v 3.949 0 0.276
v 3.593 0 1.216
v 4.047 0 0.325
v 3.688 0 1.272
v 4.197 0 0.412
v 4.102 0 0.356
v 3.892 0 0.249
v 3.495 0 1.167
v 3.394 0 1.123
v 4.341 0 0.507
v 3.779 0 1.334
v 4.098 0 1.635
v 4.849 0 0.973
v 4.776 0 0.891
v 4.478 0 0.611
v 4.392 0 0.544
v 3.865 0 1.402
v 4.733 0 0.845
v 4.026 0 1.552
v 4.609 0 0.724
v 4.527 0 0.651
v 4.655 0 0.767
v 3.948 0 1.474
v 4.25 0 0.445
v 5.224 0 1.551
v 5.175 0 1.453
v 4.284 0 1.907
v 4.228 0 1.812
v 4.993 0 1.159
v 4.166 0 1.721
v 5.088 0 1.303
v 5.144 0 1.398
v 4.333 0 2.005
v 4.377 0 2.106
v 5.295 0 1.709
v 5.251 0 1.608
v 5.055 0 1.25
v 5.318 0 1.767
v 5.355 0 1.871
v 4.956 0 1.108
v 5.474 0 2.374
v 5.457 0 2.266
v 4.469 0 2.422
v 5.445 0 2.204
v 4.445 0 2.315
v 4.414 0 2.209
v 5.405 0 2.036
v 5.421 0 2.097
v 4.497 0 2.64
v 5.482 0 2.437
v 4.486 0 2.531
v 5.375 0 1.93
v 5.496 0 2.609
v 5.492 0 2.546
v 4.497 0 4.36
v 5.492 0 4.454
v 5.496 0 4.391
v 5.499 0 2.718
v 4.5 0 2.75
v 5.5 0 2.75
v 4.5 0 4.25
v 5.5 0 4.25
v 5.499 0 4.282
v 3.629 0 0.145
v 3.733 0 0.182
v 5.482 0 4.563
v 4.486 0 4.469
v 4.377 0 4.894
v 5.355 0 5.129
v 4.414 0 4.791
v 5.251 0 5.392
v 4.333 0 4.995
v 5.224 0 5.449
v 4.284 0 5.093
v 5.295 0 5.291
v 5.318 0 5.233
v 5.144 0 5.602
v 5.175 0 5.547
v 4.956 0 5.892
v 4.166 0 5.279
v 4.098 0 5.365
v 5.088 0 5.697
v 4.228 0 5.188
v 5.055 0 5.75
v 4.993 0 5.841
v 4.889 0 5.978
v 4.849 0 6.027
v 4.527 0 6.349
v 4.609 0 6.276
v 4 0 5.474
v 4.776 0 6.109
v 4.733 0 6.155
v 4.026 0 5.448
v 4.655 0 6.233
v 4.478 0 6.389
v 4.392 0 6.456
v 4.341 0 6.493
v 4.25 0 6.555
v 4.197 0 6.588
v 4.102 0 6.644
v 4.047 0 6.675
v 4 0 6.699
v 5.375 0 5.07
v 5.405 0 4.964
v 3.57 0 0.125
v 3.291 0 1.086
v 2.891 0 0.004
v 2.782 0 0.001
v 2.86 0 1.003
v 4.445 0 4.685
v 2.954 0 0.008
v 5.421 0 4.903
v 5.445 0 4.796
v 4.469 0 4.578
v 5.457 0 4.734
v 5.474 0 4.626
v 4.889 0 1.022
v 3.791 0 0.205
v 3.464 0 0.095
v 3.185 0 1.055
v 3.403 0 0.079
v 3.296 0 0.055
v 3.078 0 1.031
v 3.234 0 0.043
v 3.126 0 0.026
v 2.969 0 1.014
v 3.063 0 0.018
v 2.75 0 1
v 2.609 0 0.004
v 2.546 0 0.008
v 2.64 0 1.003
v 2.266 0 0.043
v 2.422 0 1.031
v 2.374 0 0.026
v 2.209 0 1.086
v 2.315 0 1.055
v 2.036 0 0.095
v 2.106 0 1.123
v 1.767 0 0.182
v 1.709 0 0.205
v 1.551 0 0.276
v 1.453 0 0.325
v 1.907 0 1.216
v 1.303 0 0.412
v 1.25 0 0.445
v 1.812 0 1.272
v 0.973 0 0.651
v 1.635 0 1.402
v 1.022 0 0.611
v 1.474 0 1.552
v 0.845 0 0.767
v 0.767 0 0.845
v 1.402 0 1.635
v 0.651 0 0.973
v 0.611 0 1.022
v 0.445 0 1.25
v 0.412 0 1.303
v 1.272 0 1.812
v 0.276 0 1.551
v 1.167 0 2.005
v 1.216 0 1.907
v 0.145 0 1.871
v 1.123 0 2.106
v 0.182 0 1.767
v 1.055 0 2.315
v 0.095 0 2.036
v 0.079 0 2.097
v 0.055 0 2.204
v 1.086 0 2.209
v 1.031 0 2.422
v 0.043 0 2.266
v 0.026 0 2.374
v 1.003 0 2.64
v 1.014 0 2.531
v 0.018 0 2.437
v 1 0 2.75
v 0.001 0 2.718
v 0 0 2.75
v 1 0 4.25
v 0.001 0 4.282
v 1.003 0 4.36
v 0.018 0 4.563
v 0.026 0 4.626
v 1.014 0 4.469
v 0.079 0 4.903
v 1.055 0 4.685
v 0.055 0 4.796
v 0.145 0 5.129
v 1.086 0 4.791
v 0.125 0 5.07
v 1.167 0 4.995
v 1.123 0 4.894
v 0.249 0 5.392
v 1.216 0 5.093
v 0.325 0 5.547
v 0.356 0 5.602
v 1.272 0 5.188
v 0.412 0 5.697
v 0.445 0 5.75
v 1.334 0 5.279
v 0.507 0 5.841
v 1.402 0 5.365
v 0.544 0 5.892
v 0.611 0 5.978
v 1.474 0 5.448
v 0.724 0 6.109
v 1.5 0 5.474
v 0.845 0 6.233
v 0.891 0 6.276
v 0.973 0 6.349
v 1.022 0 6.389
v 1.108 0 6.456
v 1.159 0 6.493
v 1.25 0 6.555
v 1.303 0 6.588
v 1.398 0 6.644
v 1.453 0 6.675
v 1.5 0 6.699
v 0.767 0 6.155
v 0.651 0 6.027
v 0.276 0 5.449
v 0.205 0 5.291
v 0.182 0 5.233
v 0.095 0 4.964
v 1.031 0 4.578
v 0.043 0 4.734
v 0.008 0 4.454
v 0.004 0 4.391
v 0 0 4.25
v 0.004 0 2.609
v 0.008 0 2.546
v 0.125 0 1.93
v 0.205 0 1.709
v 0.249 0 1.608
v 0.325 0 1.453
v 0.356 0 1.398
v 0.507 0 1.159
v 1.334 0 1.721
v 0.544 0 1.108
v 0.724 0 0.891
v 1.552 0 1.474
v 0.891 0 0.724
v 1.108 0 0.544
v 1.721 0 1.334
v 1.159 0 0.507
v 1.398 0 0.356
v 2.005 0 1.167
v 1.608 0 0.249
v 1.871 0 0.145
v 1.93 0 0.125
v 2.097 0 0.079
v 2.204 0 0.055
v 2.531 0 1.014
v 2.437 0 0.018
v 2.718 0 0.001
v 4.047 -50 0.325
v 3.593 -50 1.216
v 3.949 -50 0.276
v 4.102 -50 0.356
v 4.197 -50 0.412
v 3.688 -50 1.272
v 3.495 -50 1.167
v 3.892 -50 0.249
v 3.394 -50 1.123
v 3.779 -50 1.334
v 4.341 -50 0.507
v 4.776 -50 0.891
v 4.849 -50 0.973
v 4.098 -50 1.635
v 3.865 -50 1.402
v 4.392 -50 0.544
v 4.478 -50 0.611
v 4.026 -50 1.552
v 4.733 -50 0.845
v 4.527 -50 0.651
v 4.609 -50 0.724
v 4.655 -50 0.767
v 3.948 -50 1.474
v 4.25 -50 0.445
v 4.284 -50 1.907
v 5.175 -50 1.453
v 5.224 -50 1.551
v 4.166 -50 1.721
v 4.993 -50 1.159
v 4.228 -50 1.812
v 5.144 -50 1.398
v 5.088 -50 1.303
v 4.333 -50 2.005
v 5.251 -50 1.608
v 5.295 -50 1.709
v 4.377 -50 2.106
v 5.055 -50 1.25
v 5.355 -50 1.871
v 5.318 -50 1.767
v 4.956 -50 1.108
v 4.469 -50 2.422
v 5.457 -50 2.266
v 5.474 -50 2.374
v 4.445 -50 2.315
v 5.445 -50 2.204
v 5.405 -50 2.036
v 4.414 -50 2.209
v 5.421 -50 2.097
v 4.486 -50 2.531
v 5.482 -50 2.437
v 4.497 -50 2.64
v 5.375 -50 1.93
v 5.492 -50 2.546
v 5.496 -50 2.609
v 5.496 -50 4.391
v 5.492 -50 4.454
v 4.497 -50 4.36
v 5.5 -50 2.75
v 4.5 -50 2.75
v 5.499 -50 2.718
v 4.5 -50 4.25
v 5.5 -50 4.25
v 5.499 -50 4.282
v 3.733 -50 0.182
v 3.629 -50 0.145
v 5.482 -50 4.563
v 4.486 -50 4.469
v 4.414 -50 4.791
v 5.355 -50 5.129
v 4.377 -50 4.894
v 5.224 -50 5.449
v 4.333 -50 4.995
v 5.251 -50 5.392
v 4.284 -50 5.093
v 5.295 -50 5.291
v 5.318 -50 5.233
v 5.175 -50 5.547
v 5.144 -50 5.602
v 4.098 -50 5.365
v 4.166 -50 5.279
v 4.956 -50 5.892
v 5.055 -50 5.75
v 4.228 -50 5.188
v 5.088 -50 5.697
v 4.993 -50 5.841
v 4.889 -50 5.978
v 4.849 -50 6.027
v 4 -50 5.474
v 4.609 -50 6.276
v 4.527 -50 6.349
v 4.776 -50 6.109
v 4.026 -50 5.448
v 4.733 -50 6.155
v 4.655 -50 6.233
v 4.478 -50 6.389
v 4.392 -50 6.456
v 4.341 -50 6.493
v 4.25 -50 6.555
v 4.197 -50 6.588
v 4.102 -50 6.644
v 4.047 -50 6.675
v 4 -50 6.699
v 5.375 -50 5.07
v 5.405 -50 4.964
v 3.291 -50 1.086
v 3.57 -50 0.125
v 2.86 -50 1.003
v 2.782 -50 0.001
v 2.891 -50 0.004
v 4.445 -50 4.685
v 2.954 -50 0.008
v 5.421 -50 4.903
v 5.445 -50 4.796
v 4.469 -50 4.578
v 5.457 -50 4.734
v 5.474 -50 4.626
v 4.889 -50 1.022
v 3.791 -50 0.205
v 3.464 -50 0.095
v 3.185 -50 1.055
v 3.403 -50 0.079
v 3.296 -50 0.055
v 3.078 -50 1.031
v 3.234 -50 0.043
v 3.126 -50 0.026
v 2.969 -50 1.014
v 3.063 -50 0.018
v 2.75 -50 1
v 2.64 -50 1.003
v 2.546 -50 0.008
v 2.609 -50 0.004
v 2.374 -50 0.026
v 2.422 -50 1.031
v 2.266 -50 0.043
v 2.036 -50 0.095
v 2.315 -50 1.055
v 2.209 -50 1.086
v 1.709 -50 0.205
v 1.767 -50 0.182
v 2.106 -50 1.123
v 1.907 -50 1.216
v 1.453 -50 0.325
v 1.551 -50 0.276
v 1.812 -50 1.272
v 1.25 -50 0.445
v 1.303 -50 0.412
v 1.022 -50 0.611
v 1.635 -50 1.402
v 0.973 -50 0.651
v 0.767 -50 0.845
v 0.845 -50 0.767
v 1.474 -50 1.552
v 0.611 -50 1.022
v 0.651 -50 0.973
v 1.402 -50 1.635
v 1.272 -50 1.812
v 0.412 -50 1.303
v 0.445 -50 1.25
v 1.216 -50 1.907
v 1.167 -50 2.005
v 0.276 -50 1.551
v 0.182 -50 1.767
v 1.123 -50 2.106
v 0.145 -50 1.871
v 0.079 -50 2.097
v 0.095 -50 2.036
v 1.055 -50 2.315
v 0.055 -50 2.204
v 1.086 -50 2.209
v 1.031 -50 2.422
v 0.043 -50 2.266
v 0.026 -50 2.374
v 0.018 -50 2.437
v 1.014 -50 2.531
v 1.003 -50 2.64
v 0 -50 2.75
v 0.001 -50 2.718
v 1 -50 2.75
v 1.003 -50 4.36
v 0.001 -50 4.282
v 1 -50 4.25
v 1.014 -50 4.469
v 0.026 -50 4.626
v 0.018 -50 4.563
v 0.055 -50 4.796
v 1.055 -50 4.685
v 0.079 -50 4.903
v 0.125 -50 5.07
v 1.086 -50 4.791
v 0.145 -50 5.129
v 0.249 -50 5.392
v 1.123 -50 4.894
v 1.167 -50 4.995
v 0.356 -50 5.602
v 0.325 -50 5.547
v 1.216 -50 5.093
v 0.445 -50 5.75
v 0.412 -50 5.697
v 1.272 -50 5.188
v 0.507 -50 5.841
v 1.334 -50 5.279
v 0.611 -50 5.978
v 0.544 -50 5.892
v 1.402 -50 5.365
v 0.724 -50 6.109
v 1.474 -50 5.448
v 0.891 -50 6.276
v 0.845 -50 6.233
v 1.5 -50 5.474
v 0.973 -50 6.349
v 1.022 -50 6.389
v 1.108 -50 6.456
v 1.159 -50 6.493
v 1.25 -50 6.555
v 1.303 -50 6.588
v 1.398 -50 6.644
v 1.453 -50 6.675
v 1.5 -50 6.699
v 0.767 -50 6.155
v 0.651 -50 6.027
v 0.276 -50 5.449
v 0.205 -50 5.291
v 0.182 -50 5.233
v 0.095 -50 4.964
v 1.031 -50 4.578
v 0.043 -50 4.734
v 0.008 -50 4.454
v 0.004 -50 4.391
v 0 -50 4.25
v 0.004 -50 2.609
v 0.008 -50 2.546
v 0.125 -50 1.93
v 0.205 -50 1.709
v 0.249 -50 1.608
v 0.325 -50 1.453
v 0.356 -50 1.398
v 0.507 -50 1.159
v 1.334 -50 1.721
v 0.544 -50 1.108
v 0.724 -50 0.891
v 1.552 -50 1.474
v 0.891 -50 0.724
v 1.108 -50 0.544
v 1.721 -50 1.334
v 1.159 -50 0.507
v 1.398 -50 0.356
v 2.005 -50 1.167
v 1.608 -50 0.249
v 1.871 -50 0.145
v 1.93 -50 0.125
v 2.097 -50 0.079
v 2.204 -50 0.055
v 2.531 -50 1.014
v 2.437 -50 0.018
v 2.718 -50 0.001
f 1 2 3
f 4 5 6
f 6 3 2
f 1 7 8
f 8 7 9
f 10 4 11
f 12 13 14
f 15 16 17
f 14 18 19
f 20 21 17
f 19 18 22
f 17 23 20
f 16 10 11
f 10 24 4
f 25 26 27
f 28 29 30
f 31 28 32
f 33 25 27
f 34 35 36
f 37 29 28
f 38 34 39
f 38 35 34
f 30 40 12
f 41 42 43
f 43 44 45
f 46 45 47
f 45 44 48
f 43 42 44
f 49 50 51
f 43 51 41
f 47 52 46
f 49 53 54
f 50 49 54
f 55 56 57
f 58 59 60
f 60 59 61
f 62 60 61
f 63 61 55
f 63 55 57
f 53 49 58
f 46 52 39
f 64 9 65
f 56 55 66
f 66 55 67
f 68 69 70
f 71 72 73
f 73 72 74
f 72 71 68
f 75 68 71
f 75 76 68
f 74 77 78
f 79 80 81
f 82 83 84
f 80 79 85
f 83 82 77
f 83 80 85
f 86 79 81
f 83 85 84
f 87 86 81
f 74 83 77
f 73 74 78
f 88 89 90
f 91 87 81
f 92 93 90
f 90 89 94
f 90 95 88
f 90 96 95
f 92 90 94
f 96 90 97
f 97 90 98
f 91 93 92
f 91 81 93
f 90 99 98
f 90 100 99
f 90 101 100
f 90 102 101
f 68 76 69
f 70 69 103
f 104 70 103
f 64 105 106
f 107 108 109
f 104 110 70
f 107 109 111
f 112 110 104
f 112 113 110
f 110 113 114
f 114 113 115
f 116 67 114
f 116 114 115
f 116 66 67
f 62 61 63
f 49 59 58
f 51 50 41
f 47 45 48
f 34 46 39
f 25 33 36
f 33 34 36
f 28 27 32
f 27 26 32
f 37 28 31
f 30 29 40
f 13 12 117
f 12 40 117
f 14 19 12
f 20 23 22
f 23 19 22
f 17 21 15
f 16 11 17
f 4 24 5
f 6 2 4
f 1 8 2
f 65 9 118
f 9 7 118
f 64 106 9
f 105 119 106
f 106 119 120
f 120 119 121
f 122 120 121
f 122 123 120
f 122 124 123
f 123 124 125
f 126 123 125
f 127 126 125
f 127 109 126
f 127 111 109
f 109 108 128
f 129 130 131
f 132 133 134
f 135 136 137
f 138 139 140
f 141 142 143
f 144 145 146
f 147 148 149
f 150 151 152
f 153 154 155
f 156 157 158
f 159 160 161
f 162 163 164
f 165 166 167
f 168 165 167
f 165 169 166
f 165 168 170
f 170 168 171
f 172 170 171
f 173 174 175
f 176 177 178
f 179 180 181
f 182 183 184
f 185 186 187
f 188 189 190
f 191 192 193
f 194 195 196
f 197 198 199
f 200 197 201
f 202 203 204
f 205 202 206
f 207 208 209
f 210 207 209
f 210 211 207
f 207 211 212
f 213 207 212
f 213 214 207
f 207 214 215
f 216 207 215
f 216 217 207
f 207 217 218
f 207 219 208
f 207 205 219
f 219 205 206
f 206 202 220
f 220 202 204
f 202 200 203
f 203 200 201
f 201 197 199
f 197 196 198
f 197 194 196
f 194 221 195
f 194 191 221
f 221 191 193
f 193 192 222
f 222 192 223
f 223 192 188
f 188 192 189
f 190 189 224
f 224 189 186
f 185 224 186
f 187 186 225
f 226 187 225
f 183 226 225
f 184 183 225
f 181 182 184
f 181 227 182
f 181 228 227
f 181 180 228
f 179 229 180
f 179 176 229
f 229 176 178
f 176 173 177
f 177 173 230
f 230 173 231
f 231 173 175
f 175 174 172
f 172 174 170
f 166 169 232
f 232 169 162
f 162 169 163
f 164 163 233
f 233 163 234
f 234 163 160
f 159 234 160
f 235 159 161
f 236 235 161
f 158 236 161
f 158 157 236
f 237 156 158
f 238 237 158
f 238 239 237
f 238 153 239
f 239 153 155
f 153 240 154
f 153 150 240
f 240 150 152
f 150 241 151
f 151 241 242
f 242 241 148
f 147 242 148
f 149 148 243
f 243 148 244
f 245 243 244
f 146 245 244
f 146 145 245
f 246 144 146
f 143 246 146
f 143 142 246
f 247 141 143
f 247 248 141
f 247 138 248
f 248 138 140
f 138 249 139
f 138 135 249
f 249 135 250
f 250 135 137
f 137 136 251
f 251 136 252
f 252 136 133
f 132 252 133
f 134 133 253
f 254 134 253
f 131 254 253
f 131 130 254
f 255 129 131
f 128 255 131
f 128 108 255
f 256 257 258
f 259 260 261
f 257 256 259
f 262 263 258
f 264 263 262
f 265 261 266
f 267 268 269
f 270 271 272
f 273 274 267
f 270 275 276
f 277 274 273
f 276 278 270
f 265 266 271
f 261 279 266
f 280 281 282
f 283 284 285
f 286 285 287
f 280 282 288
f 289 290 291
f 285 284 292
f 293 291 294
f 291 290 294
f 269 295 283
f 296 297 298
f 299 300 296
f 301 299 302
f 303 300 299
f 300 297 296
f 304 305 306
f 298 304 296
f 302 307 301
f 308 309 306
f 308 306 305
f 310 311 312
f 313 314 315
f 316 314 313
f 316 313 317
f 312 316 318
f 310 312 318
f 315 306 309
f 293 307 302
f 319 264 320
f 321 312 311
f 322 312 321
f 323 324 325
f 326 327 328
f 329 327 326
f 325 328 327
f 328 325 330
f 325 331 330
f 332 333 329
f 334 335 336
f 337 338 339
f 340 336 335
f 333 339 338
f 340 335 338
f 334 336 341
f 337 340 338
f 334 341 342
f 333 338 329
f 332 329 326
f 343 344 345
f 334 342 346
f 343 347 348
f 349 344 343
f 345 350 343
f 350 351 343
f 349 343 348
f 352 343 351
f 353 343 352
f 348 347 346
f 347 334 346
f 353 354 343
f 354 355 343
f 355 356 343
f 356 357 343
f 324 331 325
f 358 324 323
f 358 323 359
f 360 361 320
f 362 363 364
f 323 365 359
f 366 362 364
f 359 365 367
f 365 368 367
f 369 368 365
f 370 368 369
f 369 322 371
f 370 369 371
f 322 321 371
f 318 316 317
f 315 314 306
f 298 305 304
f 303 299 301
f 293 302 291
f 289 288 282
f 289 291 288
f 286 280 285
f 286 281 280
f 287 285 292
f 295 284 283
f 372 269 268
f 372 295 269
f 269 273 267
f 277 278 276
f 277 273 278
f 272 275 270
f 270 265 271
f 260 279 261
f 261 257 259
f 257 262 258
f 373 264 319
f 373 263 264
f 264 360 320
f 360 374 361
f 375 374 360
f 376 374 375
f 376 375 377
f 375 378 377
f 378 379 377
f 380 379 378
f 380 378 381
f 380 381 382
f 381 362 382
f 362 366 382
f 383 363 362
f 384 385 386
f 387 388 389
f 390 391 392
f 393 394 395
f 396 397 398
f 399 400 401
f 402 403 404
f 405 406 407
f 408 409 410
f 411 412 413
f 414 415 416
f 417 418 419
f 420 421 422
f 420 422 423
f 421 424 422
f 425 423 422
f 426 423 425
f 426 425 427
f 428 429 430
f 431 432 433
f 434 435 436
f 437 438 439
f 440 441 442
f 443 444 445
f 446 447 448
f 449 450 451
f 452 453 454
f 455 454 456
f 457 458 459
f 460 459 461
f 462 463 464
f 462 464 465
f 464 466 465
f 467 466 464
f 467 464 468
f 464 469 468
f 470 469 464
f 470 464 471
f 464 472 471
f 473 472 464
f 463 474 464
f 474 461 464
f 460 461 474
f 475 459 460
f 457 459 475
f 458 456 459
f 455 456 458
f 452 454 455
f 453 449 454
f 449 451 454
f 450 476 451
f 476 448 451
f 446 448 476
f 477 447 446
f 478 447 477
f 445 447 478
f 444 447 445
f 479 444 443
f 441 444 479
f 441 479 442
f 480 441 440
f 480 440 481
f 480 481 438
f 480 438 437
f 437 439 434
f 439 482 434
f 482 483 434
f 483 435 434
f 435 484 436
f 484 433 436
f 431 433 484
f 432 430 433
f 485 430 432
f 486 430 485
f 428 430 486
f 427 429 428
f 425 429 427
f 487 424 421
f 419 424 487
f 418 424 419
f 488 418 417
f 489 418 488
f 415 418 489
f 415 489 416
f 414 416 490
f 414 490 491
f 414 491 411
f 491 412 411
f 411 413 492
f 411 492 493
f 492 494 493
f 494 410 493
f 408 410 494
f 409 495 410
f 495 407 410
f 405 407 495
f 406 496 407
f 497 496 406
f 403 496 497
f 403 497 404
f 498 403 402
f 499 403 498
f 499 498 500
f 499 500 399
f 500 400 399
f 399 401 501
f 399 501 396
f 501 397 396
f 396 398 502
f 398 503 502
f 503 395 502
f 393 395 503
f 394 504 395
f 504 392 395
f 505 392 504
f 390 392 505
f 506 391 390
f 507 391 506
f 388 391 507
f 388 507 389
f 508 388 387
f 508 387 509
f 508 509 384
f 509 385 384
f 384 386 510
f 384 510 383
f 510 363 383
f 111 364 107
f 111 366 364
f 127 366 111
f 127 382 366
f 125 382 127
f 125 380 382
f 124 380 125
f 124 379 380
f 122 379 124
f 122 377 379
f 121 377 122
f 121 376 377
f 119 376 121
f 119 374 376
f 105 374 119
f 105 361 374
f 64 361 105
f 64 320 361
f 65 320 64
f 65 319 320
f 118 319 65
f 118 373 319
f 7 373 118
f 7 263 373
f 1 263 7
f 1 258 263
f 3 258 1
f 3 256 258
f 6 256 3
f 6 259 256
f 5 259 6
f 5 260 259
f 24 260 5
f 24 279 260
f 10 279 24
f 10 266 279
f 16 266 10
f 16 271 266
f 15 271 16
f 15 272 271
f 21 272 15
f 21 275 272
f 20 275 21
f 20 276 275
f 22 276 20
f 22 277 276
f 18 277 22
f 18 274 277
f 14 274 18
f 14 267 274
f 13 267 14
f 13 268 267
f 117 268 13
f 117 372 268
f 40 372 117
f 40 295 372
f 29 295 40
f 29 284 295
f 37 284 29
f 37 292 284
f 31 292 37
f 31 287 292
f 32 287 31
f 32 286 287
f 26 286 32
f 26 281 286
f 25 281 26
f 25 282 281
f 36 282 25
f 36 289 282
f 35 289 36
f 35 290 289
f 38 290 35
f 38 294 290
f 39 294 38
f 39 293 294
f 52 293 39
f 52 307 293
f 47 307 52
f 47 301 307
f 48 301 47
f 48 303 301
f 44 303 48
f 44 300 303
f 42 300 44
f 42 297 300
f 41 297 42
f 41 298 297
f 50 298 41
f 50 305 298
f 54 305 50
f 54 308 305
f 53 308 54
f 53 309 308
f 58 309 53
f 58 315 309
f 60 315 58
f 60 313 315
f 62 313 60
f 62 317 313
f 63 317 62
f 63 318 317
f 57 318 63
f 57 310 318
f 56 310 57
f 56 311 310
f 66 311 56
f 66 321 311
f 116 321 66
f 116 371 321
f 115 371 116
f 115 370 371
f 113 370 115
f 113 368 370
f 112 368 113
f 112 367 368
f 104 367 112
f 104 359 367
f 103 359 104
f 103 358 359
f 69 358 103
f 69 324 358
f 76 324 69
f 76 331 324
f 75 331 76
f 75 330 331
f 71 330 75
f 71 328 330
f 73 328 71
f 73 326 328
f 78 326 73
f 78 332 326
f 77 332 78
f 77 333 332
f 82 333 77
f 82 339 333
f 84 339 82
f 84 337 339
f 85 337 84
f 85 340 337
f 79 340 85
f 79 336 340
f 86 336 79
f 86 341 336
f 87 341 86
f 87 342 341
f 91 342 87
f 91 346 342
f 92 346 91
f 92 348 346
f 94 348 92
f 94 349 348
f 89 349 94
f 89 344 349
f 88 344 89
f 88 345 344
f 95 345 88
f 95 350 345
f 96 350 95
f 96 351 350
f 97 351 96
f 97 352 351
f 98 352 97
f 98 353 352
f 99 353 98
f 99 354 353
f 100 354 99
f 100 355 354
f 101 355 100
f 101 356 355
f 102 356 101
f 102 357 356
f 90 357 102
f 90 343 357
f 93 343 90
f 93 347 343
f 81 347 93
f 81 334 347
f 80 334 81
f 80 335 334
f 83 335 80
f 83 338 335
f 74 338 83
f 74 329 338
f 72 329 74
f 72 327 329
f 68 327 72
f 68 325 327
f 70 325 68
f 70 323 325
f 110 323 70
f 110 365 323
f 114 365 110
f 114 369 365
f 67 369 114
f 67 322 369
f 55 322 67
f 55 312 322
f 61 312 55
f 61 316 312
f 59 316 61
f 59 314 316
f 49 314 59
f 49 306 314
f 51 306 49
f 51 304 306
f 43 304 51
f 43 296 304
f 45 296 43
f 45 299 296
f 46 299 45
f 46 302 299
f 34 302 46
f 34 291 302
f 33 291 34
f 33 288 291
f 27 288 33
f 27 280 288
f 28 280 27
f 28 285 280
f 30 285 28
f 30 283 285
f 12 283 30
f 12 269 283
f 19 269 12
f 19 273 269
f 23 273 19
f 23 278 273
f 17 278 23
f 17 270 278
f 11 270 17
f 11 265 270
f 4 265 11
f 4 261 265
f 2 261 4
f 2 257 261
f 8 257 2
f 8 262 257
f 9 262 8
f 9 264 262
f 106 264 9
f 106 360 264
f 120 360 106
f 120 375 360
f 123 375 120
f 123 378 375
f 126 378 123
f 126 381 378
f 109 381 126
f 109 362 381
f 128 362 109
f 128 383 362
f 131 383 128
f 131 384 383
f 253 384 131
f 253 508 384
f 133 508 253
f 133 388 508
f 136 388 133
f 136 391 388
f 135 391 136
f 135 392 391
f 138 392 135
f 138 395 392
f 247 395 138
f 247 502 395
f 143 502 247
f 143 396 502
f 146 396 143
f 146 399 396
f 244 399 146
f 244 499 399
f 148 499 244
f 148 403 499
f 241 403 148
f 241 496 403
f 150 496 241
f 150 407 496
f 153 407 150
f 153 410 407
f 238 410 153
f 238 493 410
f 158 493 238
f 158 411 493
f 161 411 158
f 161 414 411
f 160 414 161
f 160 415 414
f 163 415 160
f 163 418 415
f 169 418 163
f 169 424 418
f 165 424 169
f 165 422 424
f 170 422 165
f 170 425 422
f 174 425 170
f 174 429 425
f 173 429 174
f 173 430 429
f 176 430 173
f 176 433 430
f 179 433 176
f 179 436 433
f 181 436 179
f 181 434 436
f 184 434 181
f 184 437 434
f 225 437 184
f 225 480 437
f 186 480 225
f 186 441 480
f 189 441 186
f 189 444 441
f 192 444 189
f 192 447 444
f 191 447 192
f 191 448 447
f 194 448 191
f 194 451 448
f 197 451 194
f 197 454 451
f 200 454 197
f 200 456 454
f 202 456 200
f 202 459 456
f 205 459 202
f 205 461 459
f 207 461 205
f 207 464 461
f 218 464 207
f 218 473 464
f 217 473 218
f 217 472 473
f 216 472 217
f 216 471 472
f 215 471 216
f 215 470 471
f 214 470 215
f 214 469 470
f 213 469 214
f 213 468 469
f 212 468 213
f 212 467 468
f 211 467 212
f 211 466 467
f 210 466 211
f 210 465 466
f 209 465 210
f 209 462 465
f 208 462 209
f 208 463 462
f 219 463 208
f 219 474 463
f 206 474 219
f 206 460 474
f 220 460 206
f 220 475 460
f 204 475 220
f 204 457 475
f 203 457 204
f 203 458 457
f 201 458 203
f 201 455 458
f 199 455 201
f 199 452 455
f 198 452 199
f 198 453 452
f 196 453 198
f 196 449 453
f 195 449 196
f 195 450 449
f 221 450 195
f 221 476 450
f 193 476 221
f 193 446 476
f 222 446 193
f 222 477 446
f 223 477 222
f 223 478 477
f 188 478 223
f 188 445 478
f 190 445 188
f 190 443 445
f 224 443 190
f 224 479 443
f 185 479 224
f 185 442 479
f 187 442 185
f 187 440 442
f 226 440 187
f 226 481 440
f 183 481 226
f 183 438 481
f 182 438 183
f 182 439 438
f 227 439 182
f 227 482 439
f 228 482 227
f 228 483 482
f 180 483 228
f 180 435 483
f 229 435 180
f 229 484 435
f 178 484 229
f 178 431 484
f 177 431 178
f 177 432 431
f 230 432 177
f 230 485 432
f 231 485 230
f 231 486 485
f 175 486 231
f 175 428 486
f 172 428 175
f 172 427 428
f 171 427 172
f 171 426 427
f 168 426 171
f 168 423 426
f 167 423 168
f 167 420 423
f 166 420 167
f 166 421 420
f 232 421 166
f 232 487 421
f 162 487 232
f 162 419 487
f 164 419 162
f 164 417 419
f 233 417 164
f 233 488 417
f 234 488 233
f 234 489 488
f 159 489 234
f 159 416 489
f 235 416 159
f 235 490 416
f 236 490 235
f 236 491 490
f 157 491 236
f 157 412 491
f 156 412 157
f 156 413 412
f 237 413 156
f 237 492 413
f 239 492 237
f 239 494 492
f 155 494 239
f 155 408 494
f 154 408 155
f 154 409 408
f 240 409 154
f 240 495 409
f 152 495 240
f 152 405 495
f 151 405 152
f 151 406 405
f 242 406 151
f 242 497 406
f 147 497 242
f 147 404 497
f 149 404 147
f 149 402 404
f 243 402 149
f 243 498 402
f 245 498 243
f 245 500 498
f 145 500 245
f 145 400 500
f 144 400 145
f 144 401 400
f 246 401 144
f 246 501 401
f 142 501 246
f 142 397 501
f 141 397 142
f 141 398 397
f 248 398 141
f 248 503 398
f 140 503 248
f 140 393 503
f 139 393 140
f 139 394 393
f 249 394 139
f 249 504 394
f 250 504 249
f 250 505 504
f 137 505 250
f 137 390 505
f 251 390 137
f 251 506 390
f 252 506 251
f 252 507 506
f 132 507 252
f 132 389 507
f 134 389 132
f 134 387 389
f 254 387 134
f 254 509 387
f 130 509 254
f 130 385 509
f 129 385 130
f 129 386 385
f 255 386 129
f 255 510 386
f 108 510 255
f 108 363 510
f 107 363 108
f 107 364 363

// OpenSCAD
$fn = 100;

module cable_cross_section(w, h){
        hull(){
                circle(d = w);
                translate([0, h - w, 0]) circle(d = w);
        }
}

module cable_cutout_cross_section(w, h, T = 1, bite = 1){
        difference(){
                offset(T) cable_cross_section(w, h);
                cable_cross_section(w, h);
                translate([-(w-bite)/2, h - w]) square([w-bite, T + w/2]);
        }
}

// cable_cutout_cross_section(3.5, 5, 1, 1);

module cable_cutout_array(w, h, n, offsets = [0, 0], T = 1){
        assert(is_list(offsets) && len(offsets) == 2);
        assert(is_list(n) && len(n) == 2 && n.x > 0 && n.y > 0);
        step_x = w + T;
        step_y = h + T;

        for(i = [0 : n.x - 1]){
                for(j = [0 : n.y - 1]){
                        translate([i * step_x + offsets.x + T + w/2, j * step_y + offsets.y +T + w/2]) cable_cutout_cross_section(w, h, T);
                }
        }
}

// cable_cutout_array(3.5, 5, [10, 10], T=1);

module corner_cutouts(r, w, h, n = [1, 1], T = 1){
        rotate_extrude(90)
                cable_cutout_array(w, h, n, T = T, offsets = [r, 0]);
}

corner_cutouts(25, 3.5, 5);

module edge_cutouts(l, w, h, n = [1, 1], T = 1){
        rotate([90, 0, 0])
        linear_extrude(l)
                cable_cutout_array(w, h, n, T = T);
}

edge_cutouts(25*2, 3.5, 5);

module spiral_cutouts(w, h, l, offsets = [0, 0, 0], d = 1){
        assert(is_list(offsets) && len(offsets) == 3);
        // SUM[i:0, n](2 * PI * (offset + step*i+w/2)) - l = 0
        // 2 * PI * (offset + w/2) * n + 2 * PI * step * n * (n-1) / 2 - l = 0
        // 2 * PI * (offset + w/2) * n + PI * step * n * (n-1) - l = 0
        // PI * step * n^2 + (2 * PI * offset - PI * d) * n - l = 0

        n = let(a = PI * (w + d), b = PI * (2 * offsets[0] - d), c = -l)
                ceil((-b + sqrt(b^2 - 4 * a * c)) / (2 * a));

        corner_cutouts(offsets[0], w, h, [n, 1], d);
        edge_cutouts(offsets[1], w, h, [n, 1], d);
}

module helical_cutouts(w, h, l, offset = 0, d = 1){
        // n * 2 * PI * (offset + w/2) = l
        n = ceil(l / (2 * PI * (offset + w/2)));

        cable_cutouts(offset, w, h, [1, n], d);
}

spiral_cutouts(3.5, 5, 350, [25, 0, 0], 1);
// helical_cutouts(3.5, 5, 350, 25, 1);
